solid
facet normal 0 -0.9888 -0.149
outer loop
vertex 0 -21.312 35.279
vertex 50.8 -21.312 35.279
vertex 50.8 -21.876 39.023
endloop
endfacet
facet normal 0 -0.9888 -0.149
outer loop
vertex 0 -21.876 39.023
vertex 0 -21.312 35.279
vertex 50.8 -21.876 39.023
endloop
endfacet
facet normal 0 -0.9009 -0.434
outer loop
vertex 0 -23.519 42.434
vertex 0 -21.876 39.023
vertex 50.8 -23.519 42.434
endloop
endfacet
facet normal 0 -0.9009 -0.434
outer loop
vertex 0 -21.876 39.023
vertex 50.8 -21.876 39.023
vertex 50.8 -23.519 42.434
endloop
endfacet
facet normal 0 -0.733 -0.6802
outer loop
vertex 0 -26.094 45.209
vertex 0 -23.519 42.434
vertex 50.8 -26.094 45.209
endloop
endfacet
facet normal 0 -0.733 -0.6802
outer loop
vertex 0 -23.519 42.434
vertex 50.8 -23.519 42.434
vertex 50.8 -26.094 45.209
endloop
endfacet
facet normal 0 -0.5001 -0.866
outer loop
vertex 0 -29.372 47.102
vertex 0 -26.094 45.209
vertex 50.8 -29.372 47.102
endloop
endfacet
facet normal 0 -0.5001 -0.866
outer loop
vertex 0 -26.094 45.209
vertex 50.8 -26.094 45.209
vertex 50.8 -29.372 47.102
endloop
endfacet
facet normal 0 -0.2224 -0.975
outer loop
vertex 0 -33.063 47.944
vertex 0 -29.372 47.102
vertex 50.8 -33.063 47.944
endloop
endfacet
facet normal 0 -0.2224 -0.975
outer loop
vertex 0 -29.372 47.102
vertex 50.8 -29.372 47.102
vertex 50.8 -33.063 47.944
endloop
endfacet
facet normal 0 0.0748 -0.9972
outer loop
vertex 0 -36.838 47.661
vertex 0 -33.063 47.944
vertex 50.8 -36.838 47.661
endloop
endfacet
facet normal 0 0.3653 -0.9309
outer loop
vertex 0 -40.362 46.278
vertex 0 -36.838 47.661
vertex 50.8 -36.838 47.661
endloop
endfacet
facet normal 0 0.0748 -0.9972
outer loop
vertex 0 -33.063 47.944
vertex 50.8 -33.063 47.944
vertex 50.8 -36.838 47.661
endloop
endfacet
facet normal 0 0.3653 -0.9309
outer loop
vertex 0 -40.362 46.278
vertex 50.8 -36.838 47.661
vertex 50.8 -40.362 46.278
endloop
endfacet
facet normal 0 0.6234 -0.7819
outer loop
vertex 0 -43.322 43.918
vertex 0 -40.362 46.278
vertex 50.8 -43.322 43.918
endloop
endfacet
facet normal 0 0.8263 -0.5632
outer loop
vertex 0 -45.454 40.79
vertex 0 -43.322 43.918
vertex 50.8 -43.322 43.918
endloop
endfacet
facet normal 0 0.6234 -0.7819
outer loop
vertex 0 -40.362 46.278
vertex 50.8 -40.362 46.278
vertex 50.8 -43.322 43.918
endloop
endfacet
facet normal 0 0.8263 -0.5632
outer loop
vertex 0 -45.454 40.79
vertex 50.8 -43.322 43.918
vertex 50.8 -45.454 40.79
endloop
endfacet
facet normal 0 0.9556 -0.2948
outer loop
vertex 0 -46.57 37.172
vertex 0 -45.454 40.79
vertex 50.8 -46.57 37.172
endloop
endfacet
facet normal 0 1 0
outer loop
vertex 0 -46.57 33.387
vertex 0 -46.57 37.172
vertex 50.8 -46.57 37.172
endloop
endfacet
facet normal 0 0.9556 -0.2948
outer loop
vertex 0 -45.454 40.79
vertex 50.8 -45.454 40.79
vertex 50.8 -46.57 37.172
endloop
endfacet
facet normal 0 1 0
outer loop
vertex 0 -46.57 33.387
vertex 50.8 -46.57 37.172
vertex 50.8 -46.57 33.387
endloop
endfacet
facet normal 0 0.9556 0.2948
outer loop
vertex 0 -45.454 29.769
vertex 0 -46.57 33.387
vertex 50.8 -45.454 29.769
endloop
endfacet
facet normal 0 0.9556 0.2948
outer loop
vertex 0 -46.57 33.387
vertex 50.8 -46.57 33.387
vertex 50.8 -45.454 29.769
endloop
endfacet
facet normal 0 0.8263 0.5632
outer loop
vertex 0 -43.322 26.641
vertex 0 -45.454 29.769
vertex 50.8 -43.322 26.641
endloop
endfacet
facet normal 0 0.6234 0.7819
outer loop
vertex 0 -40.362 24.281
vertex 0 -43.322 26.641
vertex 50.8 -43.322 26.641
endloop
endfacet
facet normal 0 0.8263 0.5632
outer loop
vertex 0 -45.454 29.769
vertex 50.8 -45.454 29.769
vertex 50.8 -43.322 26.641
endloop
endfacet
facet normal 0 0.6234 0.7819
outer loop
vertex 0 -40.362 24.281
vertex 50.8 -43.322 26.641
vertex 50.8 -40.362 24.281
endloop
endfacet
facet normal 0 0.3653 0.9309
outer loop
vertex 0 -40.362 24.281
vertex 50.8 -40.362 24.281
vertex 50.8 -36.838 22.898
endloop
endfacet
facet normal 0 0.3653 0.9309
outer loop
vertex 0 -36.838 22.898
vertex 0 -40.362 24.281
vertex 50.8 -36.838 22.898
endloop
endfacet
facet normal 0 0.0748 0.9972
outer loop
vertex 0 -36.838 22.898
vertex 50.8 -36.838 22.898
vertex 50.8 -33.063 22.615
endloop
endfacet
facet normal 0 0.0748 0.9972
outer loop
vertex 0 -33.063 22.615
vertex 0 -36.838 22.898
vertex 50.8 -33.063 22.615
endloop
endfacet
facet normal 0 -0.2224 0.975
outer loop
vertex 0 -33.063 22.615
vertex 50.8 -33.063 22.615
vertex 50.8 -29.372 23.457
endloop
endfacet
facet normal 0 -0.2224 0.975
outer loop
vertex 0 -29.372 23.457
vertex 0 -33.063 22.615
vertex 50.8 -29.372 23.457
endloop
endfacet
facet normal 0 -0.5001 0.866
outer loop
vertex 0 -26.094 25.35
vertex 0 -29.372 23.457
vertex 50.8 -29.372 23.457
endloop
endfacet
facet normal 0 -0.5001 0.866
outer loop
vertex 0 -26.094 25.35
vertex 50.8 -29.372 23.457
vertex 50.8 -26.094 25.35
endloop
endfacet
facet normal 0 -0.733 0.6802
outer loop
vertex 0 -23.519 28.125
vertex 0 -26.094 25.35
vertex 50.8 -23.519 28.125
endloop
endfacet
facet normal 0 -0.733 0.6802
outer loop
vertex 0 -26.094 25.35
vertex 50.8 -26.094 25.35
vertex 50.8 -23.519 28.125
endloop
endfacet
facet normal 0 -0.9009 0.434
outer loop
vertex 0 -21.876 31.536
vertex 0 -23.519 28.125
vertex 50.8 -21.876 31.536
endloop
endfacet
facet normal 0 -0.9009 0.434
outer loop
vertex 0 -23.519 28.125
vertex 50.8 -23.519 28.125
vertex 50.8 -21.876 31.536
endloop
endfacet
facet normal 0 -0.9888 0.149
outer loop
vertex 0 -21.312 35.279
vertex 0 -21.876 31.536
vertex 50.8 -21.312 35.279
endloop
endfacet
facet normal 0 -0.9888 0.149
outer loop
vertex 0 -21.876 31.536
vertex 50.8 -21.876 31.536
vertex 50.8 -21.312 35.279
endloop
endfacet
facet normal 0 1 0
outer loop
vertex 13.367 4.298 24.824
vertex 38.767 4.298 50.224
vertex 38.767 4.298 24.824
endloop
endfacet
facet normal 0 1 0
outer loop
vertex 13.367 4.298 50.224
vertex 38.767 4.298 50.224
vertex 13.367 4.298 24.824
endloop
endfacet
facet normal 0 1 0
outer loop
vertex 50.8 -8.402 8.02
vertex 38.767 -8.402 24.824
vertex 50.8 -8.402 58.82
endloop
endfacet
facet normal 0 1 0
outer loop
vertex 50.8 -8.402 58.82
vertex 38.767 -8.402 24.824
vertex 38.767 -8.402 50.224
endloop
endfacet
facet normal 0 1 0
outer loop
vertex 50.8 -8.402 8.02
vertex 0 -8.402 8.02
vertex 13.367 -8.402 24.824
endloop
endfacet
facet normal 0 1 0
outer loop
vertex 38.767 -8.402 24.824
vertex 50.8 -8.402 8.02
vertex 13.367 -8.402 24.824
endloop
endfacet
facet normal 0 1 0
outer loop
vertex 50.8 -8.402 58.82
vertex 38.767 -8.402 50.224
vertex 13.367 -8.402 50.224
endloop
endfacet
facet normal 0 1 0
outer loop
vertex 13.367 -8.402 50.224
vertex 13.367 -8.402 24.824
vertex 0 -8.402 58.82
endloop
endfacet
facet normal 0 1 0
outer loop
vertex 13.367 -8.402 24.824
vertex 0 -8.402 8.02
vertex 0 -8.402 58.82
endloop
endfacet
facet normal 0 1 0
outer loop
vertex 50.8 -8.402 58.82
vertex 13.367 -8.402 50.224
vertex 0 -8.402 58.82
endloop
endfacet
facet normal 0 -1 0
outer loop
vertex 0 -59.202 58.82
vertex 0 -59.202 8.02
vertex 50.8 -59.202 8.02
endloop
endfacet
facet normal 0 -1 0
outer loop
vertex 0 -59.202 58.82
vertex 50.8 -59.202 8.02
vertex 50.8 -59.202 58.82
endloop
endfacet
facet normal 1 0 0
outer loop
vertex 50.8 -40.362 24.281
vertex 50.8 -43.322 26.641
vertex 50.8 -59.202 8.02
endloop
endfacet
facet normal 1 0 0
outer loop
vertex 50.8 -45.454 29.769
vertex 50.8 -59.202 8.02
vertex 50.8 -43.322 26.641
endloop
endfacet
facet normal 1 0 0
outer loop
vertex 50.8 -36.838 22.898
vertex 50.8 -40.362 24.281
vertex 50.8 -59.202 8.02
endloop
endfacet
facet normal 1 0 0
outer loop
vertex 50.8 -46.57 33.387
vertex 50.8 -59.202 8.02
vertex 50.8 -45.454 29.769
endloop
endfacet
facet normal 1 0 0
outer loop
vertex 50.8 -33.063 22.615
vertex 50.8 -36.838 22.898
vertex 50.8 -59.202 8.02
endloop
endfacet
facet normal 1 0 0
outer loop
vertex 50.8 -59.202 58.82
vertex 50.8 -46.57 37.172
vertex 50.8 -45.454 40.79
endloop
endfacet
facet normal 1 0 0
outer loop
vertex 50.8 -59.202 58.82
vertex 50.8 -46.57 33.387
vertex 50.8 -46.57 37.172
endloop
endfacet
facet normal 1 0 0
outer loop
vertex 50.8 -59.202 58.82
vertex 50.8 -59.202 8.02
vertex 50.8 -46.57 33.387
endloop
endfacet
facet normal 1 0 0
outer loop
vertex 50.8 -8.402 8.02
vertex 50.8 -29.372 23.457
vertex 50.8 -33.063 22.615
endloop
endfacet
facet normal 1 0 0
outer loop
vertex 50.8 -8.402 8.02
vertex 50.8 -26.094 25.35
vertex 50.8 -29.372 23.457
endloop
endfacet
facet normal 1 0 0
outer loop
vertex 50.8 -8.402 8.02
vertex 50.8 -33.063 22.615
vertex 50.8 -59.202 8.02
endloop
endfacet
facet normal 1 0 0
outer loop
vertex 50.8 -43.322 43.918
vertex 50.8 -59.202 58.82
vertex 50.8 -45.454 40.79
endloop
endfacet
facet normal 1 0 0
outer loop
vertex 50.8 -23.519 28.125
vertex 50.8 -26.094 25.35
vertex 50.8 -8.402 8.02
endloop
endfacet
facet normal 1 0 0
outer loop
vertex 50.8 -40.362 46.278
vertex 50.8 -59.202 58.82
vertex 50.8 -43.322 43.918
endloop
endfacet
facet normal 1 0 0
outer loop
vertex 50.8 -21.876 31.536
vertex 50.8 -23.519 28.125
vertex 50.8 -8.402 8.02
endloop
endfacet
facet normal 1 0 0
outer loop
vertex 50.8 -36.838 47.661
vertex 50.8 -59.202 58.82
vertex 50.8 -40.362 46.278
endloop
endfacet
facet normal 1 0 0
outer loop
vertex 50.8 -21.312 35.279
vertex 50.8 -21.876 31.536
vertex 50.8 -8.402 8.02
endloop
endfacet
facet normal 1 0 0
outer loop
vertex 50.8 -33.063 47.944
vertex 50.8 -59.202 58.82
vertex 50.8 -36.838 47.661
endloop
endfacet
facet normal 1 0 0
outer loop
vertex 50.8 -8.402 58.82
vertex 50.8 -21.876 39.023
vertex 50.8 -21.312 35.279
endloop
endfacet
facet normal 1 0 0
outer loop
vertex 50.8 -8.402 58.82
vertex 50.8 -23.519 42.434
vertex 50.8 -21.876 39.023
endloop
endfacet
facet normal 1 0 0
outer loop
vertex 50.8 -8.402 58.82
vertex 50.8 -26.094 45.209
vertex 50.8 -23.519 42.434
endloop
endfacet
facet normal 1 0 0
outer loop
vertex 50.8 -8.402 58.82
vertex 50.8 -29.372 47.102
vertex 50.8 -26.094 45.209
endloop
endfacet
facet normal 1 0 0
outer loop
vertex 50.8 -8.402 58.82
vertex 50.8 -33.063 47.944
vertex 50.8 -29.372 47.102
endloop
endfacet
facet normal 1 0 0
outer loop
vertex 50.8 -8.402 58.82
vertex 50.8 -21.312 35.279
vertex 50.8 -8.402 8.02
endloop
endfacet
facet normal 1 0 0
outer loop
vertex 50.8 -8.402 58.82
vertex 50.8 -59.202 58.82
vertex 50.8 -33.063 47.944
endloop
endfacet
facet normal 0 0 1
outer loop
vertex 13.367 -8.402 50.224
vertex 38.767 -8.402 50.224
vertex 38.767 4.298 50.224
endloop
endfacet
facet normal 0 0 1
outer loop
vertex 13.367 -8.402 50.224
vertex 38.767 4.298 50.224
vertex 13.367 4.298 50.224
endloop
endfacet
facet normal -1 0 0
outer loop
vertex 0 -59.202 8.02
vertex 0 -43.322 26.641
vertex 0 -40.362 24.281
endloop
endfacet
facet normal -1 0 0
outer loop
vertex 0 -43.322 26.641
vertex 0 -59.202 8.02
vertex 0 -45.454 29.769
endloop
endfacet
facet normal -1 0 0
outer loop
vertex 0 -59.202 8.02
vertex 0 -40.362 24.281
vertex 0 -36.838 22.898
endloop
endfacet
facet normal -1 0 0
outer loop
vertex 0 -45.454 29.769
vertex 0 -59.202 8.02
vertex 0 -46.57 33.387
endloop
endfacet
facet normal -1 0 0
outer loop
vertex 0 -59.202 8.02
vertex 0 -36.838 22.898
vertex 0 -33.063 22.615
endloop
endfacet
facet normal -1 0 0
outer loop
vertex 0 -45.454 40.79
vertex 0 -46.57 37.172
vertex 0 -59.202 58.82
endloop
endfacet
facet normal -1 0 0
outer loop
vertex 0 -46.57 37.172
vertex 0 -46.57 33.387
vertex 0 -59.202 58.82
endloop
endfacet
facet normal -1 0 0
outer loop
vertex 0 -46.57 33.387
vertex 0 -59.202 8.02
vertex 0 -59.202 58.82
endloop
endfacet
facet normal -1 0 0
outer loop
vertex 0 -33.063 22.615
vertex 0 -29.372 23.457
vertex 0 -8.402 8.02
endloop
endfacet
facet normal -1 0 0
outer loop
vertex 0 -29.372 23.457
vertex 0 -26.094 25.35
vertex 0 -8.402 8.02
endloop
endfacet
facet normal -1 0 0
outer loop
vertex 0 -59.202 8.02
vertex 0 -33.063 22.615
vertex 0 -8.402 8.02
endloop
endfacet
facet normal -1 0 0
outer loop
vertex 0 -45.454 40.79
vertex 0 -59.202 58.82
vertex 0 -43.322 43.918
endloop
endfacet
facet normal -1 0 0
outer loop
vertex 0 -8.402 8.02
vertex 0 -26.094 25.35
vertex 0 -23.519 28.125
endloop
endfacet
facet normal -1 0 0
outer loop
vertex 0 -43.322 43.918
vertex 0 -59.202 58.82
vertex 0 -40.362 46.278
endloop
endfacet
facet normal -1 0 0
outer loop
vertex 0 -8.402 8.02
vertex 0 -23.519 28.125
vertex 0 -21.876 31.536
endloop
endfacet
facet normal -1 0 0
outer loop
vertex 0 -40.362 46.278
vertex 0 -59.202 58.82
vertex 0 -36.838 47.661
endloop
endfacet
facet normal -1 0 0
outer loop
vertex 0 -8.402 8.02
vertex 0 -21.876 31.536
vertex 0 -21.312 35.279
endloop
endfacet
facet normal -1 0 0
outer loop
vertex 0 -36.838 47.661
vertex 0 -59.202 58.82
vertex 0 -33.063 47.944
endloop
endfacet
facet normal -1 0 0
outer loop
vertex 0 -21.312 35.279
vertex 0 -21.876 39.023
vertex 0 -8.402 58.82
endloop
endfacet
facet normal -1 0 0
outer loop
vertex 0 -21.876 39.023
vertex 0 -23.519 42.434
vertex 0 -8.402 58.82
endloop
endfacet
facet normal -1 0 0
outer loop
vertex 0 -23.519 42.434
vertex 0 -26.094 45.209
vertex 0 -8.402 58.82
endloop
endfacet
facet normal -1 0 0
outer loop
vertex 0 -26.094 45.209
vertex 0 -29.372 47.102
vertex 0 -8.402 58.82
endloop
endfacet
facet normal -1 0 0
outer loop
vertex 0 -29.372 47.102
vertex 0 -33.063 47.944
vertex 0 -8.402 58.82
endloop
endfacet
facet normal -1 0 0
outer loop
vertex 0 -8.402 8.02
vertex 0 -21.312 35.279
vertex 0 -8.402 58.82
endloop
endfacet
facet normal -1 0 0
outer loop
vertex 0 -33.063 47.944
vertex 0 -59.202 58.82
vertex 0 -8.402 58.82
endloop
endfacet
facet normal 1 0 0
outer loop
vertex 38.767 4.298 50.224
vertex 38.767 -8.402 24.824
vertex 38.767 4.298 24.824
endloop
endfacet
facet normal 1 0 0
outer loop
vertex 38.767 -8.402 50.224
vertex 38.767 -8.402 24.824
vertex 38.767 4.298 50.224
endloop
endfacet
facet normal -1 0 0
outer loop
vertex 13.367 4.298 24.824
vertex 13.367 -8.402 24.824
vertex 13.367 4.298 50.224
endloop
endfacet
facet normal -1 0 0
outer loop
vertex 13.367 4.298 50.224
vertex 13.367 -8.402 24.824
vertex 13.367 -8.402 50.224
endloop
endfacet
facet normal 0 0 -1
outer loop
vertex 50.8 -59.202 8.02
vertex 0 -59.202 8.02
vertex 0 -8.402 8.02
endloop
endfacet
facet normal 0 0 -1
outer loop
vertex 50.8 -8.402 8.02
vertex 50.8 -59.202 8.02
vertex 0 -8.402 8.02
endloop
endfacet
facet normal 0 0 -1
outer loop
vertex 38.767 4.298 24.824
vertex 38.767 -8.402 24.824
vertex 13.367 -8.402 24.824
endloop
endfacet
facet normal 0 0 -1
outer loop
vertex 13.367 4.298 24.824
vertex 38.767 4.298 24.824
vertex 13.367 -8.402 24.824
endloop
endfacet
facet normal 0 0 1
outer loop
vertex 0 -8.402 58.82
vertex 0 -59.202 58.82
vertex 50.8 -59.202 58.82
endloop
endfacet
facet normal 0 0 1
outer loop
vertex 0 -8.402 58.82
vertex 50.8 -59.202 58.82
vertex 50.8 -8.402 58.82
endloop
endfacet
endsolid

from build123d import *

# Parameters (mm, degrees)
F0_W     = 50.8
F0_H     = 50.8
F1_DEPTH = 50.8
F2_R     = 12.7
F3_DEPTH = 50.8
F4_W     = 25.4
F4_H     = 25.4
F5_DEPTH = 12.7


with BuildPart() as f1:
    # F0 (on Right) → F1 (new body)
    with BuildSketch(Plane.YZ):
        with Locations((-33.802004, 33.420096)):
            Rectangle(F0_W, F0_H)
    extrude(amount=F1_DEPTH)

    # F2 (on face) → F3 (cut)
    with BuildSketch(Plane.YZ.offset(50.8)):
        with Locations((-34.011841, 35.279486)):
            Circle(F2_R)
    extrude(amount=-F3_DEPTH, mode=Mode.SUBTRACT)

    # F4 (on face) → F5 (join)
    with BuildSketch(Plane(origin=(0, -8.402004, 0), x_dir=(-1, 0, 0), z_dir=(0, 1, 0))):
        with Locations((-26.066826, 37.524144)):
            Rectangle(F4_W, F4_H)
    extrude(amount=F5_DEPTH)


solid = f1.part
